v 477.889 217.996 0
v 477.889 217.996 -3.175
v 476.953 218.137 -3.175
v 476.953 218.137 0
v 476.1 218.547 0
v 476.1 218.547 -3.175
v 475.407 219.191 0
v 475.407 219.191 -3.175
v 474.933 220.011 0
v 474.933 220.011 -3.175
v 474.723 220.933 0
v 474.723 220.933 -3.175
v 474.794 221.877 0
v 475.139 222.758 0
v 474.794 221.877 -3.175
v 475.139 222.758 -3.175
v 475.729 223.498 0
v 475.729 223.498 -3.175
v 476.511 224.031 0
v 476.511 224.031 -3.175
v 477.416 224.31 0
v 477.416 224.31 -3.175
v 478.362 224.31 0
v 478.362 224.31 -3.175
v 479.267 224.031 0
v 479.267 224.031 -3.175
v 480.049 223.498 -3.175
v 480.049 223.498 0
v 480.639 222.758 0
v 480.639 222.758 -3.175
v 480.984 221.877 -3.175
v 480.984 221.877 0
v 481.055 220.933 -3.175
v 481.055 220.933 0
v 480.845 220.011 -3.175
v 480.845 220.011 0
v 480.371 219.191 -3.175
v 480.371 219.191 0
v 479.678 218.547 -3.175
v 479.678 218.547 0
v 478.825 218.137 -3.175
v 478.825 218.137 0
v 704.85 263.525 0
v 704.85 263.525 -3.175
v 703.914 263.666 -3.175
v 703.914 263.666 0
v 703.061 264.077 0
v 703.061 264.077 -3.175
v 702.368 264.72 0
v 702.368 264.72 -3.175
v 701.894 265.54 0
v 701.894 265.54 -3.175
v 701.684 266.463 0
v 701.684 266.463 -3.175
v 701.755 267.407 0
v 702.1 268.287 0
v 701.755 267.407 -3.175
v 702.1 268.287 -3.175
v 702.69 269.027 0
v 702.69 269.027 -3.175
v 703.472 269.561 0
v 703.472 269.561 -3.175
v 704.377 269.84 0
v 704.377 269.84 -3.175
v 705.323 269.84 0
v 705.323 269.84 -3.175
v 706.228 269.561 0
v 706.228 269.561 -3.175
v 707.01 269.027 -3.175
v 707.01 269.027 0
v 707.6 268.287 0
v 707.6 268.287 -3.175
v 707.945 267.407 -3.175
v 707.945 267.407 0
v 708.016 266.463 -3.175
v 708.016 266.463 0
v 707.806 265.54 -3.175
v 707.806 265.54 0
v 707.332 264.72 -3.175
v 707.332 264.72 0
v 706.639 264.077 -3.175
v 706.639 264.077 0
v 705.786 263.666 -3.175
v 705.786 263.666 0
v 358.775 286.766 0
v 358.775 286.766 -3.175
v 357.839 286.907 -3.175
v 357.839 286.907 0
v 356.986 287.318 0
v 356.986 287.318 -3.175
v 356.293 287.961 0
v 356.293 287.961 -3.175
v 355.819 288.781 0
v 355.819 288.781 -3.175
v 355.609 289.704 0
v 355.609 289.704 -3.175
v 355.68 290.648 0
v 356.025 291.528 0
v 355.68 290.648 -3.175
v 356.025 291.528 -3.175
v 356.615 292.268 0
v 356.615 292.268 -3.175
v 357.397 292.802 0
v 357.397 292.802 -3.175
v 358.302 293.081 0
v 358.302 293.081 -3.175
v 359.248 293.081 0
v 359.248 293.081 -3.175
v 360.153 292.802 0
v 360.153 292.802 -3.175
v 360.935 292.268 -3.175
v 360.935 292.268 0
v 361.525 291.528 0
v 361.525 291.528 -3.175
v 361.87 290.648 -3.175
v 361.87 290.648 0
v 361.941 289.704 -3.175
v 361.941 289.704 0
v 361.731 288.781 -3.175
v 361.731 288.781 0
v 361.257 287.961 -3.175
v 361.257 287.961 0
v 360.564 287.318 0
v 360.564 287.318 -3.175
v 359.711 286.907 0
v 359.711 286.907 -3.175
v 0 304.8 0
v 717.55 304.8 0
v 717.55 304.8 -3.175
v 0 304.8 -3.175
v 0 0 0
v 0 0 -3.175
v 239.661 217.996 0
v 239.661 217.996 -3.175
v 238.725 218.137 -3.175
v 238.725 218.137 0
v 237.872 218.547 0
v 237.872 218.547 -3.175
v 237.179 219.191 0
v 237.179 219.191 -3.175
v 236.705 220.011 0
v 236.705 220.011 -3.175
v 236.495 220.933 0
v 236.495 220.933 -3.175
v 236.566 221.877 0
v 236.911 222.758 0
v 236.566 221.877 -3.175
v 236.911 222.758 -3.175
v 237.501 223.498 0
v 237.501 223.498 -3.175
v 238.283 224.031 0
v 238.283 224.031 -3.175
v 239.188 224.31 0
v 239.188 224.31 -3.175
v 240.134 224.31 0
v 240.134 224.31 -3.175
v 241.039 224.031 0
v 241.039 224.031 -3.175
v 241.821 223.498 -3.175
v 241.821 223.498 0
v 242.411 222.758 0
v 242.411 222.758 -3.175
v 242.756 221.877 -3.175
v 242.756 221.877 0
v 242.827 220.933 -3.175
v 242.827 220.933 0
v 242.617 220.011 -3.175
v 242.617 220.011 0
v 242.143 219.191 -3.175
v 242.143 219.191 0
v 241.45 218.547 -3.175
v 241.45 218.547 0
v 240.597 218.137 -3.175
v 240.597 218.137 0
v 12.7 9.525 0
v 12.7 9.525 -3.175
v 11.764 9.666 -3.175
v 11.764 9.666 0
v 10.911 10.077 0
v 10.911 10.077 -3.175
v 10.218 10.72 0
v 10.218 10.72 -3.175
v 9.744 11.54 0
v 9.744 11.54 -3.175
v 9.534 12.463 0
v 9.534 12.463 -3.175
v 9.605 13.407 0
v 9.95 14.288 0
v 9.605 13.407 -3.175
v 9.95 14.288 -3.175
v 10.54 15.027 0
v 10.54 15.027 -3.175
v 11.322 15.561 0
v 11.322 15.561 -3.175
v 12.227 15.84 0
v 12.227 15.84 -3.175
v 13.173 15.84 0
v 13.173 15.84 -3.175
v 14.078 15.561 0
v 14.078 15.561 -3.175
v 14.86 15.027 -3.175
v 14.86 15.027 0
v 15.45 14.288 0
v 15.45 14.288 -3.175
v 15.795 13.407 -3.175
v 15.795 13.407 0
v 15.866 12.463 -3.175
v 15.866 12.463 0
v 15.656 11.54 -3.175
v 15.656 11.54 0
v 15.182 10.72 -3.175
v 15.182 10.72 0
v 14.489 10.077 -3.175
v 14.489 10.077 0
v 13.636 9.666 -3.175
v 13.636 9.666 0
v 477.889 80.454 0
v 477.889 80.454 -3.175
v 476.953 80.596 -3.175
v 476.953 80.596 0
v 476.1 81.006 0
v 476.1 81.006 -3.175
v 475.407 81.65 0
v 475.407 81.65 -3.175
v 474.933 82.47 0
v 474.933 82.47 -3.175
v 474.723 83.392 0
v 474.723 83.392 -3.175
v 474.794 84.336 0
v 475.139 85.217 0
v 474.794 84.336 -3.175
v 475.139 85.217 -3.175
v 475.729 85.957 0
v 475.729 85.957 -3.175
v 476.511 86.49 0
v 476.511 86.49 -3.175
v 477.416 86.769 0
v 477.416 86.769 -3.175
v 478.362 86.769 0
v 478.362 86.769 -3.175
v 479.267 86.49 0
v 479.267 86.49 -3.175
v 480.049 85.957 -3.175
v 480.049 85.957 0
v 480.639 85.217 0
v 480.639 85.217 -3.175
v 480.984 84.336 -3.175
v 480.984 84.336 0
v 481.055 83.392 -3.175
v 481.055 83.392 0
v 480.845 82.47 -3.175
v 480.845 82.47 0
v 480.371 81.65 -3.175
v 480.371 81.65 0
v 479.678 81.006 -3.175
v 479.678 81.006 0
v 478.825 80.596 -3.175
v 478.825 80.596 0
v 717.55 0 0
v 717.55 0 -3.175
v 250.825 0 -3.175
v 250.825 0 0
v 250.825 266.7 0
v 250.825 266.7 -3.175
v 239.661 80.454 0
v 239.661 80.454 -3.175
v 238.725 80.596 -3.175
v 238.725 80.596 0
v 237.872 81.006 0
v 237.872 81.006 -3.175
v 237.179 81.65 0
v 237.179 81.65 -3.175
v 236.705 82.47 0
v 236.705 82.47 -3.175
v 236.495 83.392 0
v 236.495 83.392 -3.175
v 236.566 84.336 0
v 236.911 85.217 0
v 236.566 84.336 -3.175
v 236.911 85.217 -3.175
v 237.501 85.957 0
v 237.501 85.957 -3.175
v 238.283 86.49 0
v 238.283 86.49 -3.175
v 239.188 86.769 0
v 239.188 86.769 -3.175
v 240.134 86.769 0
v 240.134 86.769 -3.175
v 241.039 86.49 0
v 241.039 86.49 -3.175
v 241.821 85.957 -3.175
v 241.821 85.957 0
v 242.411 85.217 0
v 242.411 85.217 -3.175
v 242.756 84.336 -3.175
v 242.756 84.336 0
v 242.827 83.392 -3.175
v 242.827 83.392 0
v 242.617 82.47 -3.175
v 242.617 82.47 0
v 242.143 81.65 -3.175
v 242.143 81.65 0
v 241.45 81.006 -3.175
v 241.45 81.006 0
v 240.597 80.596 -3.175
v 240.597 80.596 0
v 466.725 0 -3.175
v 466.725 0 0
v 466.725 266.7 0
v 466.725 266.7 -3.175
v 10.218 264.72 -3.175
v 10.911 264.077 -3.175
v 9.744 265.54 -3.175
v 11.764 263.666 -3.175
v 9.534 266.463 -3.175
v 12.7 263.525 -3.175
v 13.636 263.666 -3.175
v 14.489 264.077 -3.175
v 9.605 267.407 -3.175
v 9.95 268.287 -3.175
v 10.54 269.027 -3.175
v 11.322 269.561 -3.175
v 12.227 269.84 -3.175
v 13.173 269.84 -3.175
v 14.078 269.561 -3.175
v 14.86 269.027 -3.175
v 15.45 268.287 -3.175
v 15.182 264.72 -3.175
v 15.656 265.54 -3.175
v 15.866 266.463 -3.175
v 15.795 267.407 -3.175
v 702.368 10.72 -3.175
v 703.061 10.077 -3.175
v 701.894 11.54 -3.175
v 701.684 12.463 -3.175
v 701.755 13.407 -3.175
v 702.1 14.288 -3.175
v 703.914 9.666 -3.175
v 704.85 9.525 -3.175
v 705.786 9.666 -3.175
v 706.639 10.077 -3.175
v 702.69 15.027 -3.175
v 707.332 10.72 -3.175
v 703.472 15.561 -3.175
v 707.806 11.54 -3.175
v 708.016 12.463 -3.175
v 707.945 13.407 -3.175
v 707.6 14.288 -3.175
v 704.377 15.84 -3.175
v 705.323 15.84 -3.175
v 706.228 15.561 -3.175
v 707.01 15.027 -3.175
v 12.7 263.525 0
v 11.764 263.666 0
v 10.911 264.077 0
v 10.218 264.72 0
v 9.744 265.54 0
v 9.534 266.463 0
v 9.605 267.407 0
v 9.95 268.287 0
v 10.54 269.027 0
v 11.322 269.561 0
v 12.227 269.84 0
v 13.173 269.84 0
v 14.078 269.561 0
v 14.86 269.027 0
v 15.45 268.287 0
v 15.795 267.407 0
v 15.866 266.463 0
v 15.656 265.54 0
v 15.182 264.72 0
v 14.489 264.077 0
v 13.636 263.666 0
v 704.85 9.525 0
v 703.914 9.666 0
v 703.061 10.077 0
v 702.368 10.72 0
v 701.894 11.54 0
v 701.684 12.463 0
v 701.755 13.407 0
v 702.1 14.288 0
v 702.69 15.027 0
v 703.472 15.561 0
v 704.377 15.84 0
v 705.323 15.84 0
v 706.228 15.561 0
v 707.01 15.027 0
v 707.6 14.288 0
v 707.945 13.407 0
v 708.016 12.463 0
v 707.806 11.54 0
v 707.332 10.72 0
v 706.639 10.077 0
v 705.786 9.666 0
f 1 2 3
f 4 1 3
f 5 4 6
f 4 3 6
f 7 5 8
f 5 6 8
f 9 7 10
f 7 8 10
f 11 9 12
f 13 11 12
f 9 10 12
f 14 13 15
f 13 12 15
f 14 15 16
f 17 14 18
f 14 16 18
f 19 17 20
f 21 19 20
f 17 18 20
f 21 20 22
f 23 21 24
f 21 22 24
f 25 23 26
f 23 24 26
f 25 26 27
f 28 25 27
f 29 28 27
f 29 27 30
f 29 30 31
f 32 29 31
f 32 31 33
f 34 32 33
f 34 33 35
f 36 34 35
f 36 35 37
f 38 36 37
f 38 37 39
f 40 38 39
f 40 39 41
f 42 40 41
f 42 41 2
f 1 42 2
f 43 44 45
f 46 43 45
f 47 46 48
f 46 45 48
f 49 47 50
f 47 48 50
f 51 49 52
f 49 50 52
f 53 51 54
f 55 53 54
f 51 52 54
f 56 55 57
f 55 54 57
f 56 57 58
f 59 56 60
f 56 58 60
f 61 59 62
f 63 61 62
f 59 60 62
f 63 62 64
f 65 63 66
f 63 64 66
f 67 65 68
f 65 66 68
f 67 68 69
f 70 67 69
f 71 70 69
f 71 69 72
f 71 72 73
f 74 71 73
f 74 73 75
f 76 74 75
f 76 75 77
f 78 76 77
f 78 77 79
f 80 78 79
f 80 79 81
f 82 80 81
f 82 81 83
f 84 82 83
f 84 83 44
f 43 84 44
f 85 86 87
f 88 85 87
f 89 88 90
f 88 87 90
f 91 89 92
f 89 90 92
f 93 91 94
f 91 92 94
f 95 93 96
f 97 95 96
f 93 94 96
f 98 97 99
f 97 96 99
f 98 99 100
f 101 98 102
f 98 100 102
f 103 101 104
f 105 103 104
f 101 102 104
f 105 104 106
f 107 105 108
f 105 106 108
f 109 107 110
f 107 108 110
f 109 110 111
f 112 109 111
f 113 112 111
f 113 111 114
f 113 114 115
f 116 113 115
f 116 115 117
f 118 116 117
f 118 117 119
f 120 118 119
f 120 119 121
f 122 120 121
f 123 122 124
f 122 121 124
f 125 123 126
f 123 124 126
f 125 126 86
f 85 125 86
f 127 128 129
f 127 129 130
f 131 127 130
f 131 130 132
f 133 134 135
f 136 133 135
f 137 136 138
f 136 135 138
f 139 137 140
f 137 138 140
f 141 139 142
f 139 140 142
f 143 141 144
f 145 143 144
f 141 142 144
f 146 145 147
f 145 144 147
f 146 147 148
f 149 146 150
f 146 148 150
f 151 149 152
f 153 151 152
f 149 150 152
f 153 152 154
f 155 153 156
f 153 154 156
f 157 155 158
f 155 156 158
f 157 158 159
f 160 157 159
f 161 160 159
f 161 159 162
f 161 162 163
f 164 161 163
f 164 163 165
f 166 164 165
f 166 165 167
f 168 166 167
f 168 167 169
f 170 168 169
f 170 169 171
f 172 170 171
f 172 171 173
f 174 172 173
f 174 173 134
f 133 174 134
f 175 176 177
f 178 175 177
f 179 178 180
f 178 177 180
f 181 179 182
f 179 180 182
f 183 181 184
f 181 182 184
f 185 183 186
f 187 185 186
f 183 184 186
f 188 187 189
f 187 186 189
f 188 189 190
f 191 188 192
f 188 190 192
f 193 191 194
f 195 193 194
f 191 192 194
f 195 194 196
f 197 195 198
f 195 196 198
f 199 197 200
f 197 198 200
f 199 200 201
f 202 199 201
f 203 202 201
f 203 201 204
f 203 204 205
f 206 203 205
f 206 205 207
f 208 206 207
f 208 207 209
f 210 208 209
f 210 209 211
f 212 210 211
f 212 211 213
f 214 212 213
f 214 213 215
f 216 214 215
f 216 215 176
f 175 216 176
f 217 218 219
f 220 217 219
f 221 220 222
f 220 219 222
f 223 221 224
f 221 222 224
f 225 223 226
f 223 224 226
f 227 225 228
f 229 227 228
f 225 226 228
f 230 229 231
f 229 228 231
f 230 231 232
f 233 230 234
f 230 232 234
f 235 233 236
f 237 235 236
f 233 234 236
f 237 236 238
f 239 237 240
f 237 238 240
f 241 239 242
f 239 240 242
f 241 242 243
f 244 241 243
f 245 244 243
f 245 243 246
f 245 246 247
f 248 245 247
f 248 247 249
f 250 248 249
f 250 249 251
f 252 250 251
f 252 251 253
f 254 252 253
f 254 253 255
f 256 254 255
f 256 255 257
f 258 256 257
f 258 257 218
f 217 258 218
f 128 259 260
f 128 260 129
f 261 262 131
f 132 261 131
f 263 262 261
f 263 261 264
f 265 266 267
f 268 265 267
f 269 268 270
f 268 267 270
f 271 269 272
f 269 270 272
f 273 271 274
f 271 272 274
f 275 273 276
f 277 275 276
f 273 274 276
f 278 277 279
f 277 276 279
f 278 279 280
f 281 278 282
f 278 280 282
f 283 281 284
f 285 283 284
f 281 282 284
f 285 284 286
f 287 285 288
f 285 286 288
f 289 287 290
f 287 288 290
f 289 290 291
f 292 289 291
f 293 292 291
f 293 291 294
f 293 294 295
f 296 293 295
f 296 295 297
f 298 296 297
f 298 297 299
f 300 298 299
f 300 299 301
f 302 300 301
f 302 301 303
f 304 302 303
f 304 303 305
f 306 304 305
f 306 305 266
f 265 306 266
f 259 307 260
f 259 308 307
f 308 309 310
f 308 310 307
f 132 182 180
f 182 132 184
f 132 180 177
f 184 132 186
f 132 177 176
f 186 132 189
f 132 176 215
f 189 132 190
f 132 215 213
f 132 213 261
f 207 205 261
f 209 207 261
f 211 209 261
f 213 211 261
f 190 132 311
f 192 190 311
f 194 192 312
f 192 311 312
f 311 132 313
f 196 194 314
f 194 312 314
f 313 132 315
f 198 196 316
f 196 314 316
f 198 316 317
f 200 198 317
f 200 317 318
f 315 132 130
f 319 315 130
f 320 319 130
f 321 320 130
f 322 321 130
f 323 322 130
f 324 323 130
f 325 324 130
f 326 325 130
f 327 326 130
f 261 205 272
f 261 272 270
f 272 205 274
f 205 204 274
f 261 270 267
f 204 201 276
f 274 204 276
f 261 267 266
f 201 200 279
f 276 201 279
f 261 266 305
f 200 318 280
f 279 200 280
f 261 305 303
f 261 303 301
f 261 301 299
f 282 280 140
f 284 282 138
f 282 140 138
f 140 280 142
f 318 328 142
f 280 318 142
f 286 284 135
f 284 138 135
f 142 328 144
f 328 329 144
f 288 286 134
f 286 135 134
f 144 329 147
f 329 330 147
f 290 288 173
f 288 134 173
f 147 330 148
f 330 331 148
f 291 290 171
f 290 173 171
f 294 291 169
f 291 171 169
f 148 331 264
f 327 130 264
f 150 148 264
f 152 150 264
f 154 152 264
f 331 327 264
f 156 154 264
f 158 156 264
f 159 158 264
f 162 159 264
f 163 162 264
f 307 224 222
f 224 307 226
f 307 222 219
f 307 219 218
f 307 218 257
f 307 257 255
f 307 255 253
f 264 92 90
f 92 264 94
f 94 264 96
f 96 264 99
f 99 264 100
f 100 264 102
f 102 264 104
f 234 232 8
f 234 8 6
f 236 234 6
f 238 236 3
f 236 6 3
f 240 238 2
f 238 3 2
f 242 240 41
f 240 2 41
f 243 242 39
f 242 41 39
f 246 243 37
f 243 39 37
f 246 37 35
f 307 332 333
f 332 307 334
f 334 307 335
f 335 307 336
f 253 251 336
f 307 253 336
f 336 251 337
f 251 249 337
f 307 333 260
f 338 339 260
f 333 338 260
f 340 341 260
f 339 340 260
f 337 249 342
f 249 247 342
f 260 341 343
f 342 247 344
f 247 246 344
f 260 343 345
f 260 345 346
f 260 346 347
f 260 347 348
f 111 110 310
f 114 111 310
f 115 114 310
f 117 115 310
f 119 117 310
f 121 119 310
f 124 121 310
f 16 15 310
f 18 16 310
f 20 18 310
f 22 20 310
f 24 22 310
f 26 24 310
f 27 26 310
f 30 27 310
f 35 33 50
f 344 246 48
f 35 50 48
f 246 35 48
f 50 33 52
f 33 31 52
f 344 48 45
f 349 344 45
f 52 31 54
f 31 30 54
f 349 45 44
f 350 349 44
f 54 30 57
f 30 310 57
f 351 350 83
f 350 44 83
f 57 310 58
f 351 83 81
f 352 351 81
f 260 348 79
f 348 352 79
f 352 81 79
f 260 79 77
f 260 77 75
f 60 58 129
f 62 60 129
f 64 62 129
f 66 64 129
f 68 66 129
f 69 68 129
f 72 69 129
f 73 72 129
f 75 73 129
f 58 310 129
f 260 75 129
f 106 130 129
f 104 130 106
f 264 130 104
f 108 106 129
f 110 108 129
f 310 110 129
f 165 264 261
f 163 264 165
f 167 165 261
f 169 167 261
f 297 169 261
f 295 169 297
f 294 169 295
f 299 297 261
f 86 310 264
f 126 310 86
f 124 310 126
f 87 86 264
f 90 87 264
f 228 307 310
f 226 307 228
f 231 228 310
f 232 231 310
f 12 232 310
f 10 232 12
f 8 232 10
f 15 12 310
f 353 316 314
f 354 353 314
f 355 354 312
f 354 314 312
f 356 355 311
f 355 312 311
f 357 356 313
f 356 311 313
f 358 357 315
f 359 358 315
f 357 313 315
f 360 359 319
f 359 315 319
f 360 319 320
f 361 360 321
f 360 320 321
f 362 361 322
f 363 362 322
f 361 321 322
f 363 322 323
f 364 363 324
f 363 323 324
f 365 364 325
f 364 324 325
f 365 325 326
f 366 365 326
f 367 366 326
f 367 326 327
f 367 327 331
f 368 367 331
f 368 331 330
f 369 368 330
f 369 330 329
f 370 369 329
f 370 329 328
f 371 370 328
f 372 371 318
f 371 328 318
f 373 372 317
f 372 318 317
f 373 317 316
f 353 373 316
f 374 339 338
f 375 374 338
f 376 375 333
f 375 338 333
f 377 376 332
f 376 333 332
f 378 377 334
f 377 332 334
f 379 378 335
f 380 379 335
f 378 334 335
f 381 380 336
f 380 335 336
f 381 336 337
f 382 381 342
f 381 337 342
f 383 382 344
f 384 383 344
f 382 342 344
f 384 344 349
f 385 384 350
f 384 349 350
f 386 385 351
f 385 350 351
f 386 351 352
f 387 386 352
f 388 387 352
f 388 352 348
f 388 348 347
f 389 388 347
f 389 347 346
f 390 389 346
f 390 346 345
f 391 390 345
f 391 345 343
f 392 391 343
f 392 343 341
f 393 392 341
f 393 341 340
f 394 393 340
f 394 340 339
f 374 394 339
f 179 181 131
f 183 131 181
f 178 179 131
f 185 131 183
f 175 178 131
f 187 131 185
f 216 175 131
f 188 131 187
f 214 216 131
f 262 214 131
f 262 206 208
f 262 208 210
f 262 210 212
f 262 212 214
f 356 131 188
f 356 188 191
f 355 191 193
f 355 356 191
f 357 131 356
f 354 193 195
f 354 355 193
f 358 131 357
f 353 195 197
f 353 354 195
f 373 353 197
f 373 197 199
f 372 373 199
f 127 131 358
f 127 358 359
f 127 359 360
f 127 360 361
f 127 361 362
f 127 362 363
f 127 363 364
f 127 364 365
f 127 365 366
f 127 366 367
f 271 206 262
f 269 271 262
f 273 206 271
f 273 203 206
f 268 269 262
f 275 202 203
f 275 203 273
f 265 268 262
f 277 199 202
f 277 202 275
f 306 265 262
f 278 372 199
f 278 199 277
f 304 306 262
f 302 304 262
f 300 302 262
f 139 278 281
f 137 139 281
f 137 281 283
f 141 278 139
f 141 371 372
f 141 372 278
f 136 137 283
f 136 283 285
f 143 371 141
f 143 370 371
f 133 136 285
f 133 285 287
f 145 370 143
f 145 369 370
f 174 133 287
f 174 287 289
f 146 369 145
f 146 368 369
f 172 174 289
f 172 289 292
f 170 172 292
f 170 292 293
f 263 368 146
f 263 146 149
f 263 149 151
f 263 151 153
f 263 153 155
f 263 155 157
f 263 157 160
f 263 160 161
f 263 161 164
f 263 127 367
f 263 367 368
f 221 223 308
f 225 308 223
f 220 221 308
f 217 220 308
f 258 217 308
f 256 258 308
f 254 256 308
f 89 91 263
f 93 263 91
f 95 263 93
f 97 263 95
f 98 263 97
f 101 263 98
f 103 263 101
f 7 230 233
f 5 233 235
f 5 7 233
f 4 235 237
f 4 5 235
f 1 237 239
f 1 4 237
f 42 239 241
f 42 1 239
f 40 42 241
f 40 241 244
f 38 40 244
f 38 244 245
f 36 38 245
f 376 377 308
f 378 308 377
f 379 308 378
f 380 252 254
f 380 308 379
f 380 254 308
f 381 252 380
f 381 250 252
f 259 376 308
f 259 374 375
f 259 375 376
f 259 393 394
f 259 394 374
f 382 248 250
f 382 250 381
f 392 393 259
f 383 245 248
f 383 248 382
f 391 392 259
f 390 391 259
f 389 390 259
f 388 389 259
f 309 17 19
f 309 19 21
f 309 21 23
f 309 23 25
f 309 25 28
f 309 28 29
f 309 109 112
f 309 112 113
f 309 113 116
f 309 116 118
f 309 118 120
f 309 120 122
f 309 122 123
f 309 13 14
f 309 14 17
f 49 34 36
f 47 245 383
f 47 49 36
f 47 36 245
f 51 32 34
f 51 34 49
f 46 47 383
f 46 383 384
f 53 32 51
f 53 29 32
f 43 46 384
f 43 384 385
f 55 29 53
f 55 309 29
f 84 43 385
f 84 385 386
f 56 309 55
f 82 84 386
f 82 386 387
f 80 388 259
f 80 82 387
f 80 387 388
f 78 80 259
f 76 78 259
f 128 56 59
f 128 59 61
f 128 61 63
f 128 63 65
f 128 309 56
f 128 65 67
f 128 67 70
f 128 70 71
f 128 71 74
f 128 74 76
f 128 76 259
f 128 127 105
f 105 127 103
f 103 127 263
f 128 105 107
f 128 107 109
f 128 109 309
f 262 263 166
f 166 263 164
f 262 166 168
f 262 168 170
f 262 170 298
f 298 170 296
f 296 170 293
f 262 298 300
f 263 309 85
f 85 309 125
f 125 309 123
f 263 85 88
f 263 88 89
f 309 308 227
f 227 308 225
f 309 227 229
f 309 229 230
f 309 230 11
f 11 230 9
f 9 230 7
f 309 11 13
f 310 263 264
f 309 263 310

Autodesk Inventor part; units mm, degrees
ref_plane "YZ Plane" through (0, 0, 0) normal (1, 0, 0) x (0, 1, 0)
ref_plane "XZ Plane" through (0, 0, 0) normal (0, 1, 0) x (-1, 0, 0)
ref_plane "XY Plane" through (0, 0, 0) normal (0, 0, 1) x (1, 0, 0)
sketch "Sketch1" plane through (0, 0, 0) normal (0, 0, 1) x (1, 0, 0)
  line L0 (717.55, 0) -> (717.55, 304.8)
  line L1 (717.55, 304.8) -> (0, 304.8)
  line L2 (0, 304.8) -> (0, 0)
  line L3 (250.825, 0) -> (250.825, 266.7)
  line L4 (250.825, 266.7) -> (466.725, 266.7)
  line L5 (466.725, 266.7) -> (466.725, 0)
  line L6 (466.725, 0) -> (717.55, 0)
  line L7 (250.825, 0) -> (0, 0)
  point P0 (358.775, 152.4)
  point P1 (358.775, 289.941)
  point P2 (239.661, 221.1705)
  point P3 (239.661, 83.6295)
  point P4 (358.775, 14.859)
  point P5 (477.889, 83.6295)
  point P6 (477.889, 221.1705)
  point P7 (12.7, 266.7)
  point P8 (12.7, 12.7)
  point P9 (704.85, 12.7)
  point P10 (704.85, 266.7)
  dimension "d0" = 717.55
  dimension "d1" = 304.8
  dimension "d2" = 358.775
  dimension "d3" = 152.4
  dimension "d4" = 137.541
  dimension "d7" = 360
  dimension "d11" = 38.1
  dimension "d21" = 38.1
  dimension "d22" = 12.7
  dimension "d23" = 12.7
  dimension "d24" = 12.7
  dimension "d25" = 12.7
  dimension "d26" = 12.7
  dimension "d27" = 12.7
  dimension "d28" = 38.1
  dimension "d36" = 107.95
  dimension "d37" = 107.95
extrude "Extrusion1" add sketch "Sketch1" against normal blind 3.175
hole "Hole1" at (358.775, 152.4, 0) at (358.775, 289.941, 0) at (239.661, 221.1705, 0) at (239.661, 83.6295, 0) at (358.775, 14.859, 0) at (477.889, 83.6295, 0) at (477.889, 221.1705, 0) direction (0, 0, -1) diameter 6.35 depth 25.4 tip angle 118
hole "Hole2" at (12.7, 266.7, 0) at (12.7, 12.7, 0) at (704.85, 12.7, 0) at (704.85, 266.7, 0) direction (0, 0, -1) diameter 6.35 depth 25.4 tip angle 118
properties part number "top plate"
